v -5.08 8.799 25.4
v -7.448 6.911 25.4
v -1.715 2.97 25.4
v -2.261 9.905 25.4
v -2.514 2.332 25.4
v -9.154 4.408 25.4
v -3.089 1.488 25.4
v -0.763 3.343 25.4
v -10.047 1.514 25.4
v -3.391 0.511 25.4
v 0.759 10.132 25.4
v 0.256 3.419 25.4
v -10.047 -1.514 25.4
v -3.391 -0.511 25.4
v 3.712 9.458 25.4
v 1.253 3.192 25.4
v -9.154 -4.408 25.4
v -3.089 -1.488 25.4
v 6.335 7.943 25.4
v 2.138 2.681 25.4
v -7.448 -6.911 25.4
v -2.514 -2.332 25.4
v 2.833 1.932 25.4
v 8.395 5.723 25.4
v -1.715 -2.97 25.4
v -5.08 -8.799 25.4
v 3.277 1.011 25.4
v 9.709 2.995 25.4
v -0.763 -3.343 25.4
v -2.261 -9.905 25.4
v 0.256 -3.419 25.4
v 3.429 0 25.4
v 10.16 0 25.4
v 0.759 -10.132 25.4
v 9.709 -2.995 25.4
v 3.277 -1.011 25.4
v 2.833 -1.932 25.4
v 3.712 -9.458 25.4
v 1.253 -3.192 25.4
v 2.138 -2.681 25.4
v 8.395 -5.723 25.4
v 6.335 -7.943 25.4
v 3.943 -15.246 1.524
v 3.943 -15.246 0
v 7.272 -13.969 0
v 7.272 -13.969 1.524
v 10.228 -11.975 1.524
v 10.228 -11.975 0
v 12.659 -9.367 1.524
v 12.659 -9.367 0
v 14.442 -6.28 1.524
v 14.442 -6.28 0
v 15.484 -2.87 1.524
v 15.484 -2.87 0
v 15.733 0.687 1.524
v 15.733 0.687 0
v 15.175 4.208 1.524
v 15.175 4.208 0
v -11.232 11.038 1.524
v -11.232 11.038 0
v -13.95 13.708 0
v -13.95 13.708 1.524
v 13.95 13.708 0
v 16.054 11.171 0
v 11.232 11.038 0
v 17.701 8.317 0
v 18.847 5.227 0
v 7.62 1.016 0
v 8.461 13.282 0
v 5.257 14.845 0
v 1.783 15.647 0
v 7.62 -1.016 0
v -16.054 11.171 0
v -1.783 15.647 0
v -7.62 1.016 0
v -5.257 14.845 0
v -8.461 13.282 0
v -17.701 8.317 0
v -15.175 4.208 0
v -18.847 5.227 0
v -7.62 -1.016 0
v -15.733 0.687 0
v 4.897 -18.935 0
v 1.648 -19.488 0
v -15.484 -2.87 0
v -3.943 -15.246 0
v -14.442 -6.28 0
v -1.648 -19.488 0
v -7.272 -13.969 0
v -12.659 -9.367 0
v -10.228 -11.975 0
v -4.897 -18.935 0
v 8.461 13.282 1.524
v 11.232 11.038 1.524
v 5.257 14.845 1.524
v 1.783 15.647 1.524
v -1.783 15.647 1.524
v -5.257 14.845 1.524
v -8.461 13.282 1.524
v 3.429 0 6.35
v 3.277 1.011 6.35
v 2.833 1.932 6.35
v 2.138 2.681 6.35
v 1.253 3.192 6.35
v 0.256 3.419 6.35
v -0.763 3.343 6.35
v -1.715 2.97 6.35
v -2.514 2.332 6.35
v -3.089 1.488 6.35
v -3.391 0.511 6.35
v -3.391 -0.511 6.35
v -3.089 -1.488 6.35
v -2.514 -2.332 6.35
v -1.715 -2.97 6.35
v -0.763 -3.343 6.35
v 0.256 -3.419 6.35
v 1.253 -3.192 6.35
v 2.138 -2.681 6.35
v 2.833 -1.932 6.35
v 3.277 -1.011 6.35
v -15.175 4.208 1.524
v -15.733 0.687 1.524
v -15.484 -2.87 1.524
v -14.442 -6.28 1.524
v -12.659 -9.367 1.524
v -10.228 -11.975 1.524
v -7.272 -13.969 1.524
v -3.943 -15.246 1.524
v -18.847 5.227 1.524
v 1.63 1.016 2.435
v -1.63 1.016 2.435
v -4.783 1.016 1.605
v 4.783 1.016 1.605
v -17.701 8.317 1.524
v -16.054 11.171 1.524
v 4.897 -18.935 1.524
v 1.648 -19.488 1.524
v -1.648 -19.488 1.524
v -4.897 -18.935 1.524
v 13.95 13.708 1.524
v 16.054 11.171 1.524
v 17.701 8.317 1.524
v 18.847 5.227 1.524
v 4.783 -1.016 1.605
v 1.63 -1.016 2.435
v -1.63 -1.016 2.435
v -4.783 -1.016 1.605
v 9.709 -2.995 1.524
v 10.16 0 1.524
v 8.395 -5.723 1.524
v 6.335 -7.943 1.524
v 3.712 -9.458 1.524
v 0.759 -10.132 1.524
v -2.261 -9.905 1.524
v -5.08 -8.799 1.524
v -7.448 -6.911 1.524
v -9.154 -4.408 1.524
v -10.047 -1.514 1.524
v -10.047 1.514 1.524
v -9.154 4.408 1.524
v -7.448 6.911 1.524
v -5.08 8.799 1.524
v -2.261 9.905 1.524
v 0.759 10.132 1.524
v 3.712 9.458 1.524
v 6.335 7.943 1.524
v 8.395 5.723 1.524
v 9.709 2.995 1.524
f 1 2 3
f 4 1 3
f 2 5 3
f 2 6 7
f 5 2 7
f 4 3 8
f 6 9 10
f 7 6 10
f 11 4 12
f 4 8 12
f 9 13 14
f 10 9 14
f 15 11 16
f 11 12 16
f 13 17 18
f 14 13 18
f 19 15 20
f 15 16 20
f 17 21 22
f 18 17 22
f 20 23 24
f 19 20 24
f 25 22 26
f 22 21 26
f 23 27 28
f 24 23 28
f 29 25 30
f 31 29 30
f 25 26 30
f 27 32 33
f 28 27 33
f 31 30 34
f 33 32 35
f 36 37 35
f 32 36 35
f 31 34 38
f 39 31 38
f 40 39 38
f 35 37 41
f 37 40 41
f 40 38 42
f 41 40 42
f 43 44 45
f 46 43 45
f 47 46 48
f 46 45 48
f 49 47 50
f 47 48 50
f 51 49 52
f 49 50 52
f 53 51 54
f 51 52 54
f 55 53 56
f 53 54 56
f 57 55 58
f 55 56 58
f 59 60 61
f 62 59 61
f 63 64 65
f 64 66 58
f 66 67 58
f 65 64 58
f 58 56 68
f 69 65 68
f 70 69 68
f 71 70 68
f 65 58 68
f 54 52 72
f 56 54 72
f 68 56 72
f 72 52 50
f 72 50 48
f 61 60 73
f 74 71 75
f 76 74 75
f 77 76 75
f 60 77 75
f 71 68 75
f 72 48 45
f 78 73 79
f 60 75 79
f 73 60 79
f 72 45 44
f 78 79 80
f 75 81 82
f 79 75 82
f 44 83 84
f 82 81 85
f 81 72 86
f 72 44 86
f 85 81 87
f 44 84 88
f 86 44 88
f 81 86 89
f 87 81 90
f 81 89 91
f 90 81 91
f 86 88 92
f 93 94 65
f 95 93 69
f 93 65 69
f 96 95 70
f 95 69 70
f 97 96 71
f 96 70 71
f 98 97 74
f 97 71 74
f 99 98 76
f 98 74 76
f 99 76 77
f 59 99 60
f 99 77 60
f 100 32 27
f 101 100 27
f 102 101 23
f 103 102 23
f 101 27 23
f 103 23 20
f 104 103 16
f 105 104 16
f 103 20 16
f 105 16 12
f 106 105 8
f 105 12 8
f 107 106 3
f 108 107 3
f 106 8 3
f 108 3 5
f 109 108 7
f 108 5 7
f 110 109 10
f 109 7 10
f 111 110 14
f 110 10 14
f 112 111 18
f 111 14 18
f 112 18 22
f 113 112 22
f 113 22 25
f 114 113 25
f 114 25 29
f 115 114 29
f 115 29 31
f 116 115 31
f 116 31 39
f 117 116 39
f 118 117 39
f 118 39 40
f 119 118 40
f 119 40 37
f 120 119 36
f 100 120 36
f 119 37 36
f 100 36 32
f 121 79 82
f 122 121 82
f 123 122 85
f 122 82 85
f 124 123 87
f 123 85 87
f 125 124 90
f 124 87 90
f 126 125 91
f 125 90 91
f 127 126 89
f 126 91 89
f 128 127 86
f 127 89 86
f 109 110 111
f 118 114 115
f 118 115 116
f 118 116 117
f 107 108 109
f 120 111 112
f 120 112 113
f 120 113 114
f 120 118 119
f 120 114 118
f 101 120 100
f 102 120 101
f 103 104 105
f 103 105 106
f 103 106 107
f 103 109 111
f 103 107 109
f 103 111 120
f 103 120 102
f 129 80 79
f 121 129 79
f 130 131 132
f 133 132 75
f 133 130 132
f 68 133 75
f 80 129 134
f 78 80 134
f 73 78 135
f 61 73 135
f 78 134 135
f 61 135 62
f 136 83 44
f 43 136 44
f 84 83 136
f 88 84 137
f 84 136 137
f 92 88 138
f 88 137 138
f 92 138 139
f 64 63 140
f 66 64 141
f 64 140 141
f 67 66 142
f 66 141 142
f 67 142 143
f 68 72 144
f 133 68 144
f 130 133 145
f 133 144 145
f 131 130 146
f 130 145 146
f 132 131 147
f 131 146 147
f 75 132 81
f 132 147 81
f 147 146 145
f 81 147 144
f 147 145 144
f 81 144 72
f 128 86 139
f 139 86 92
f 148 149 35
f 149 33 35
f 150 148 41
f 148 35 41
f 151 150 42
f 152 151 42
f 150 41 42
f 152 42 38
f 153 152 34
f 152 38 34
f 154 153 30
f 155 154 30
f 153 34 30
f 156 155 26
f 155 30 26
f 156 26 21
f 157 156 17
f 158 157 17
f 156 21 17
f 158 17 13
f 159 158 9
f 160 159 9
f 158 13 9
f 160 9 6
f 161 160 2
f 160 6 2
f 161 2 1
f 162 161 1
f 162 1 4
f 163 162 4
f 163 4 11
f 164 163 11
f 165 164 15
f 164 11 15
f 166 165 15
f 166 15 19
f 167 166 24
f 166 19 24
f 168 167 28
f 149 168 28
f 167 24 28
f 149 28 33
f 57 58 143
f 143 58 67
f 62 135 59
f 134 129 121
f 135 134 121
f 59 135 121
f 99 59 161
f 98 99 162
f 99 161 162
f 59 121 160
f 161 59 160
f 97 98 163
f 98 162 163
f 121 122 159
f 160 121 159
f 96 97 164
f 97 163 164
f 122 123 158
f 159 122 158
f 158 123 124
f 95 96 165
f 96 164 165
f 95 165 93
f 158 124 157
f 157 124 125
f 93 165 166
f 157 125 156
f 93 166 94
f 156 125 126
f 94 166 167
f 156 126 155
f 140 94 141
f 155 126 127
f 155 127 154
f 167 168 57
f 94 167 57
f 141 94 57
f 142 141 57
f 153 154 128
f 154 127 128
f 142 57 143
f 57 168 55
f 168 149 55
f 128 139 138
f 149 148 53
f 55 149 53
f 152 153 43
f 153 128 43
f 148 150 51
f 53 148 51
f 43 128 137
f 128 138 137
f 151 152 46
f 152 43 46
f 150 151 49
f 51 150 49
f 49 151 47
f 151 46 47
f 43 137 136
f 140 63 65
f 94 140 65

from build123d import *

# Parameters (mm, degrees)
F3_DEPTH = 25.401
F4_R     = 3.429
F5_DEPTH = 19.05
F6_R     = 12.7
F7_DEPTH = 1.016


with BuildPart() as f1:
    # F0 (on Front) → F1 (revolve)
    with BuildSketch(Plane.XZ):
        Polygon((0, 25.4), (0, 0), (19.558, 0), (19.558, 1.524), (10.16, 1.524), (10.16, 25.4), align=None)
    revolve(axis=Axis((0, 0, 10.4228793643), (0, 0, -1)))

    # F2 (on face) → F3 (cut, through all)
    with BuildSketch(Plane(origin=(0, 0, 0), x_dir=(1, 0, 0), z_dir=(0, 0, -1))):
        with BuildLine():
            Line((-3.9429843038, 15.2463890407), (-4.8969321193, 18.9350315505))
            ThreePointArc((-4.8969321193, 18.9350315505), (-16.9377248472, 9.779), (-18.8466844039, -5.2266481593))
            Line((-18.8466844039, -5.2266481593), (-15.1752523771, -4.2084699465))
            ThreePointArc((-15.1752523771, -4.2084699465), (-13.6381680588, 7.874), (-3.9429843038, 15.2463890407))
        make_face()
        with BuildLine():
            Line((4.8969321193, 18.9350315505), (3.9429843038, 15.2463890407))
            ThreePointArc((3.9429843038, 15.2463890407), (13.6381680588, 7.874), (15.1752523771, -4.2084699465))
            Line((15.1752523771, -4.2084699465), (18.8466844039, -5.2266481593))
            ThreePointArc((18.8466844039, -5.2266481593), (19.3793552211, -2.6374144943), (19.558, 0))
            ThreePointArc((19.558, 0), (15.4643066833, 11.9737455629), (4.8969321193, 18.9350315505))
        make_face()
        with BuildLine():
            ThreePointArc((-13.9497522846, -13.7083833912), (0, -19.558), (13.9497522846, -13.7083833912))
            Line((13.9497522846, -13.7083833912), (11.2322680733, -11.0379190942))
            ThreePointArc((11.2322680733, -11.0379190942), (0, -15.748), (-11.2322680733, -11.0379190942))
            Line((-11.2322680733, -11.0379190942), (-13.9497522846, -13.7083833912))
        make_face()
    extrude(amount=-F3_DEPTH, mode=Mode.SUBTRACT)

    # F4 (on face) → F5 (cut)
    with BuildSketch(Plane.XY.offset(25.4)):
        Circle(F4_R)
    extrude(amount=-F5_DEPTH, mode=Mode.SUBTRACT)

    # F6 (on Front) → F7 (cut, symmetric)
    with BuildSketch(Plane.XZ):
        with Locations((0, -10.16)):
            Circle(F6_R)
    extrude(amount=F7_DEPTH, both=True, mode=Mode.SUBTRACT)


solid = f1.part
